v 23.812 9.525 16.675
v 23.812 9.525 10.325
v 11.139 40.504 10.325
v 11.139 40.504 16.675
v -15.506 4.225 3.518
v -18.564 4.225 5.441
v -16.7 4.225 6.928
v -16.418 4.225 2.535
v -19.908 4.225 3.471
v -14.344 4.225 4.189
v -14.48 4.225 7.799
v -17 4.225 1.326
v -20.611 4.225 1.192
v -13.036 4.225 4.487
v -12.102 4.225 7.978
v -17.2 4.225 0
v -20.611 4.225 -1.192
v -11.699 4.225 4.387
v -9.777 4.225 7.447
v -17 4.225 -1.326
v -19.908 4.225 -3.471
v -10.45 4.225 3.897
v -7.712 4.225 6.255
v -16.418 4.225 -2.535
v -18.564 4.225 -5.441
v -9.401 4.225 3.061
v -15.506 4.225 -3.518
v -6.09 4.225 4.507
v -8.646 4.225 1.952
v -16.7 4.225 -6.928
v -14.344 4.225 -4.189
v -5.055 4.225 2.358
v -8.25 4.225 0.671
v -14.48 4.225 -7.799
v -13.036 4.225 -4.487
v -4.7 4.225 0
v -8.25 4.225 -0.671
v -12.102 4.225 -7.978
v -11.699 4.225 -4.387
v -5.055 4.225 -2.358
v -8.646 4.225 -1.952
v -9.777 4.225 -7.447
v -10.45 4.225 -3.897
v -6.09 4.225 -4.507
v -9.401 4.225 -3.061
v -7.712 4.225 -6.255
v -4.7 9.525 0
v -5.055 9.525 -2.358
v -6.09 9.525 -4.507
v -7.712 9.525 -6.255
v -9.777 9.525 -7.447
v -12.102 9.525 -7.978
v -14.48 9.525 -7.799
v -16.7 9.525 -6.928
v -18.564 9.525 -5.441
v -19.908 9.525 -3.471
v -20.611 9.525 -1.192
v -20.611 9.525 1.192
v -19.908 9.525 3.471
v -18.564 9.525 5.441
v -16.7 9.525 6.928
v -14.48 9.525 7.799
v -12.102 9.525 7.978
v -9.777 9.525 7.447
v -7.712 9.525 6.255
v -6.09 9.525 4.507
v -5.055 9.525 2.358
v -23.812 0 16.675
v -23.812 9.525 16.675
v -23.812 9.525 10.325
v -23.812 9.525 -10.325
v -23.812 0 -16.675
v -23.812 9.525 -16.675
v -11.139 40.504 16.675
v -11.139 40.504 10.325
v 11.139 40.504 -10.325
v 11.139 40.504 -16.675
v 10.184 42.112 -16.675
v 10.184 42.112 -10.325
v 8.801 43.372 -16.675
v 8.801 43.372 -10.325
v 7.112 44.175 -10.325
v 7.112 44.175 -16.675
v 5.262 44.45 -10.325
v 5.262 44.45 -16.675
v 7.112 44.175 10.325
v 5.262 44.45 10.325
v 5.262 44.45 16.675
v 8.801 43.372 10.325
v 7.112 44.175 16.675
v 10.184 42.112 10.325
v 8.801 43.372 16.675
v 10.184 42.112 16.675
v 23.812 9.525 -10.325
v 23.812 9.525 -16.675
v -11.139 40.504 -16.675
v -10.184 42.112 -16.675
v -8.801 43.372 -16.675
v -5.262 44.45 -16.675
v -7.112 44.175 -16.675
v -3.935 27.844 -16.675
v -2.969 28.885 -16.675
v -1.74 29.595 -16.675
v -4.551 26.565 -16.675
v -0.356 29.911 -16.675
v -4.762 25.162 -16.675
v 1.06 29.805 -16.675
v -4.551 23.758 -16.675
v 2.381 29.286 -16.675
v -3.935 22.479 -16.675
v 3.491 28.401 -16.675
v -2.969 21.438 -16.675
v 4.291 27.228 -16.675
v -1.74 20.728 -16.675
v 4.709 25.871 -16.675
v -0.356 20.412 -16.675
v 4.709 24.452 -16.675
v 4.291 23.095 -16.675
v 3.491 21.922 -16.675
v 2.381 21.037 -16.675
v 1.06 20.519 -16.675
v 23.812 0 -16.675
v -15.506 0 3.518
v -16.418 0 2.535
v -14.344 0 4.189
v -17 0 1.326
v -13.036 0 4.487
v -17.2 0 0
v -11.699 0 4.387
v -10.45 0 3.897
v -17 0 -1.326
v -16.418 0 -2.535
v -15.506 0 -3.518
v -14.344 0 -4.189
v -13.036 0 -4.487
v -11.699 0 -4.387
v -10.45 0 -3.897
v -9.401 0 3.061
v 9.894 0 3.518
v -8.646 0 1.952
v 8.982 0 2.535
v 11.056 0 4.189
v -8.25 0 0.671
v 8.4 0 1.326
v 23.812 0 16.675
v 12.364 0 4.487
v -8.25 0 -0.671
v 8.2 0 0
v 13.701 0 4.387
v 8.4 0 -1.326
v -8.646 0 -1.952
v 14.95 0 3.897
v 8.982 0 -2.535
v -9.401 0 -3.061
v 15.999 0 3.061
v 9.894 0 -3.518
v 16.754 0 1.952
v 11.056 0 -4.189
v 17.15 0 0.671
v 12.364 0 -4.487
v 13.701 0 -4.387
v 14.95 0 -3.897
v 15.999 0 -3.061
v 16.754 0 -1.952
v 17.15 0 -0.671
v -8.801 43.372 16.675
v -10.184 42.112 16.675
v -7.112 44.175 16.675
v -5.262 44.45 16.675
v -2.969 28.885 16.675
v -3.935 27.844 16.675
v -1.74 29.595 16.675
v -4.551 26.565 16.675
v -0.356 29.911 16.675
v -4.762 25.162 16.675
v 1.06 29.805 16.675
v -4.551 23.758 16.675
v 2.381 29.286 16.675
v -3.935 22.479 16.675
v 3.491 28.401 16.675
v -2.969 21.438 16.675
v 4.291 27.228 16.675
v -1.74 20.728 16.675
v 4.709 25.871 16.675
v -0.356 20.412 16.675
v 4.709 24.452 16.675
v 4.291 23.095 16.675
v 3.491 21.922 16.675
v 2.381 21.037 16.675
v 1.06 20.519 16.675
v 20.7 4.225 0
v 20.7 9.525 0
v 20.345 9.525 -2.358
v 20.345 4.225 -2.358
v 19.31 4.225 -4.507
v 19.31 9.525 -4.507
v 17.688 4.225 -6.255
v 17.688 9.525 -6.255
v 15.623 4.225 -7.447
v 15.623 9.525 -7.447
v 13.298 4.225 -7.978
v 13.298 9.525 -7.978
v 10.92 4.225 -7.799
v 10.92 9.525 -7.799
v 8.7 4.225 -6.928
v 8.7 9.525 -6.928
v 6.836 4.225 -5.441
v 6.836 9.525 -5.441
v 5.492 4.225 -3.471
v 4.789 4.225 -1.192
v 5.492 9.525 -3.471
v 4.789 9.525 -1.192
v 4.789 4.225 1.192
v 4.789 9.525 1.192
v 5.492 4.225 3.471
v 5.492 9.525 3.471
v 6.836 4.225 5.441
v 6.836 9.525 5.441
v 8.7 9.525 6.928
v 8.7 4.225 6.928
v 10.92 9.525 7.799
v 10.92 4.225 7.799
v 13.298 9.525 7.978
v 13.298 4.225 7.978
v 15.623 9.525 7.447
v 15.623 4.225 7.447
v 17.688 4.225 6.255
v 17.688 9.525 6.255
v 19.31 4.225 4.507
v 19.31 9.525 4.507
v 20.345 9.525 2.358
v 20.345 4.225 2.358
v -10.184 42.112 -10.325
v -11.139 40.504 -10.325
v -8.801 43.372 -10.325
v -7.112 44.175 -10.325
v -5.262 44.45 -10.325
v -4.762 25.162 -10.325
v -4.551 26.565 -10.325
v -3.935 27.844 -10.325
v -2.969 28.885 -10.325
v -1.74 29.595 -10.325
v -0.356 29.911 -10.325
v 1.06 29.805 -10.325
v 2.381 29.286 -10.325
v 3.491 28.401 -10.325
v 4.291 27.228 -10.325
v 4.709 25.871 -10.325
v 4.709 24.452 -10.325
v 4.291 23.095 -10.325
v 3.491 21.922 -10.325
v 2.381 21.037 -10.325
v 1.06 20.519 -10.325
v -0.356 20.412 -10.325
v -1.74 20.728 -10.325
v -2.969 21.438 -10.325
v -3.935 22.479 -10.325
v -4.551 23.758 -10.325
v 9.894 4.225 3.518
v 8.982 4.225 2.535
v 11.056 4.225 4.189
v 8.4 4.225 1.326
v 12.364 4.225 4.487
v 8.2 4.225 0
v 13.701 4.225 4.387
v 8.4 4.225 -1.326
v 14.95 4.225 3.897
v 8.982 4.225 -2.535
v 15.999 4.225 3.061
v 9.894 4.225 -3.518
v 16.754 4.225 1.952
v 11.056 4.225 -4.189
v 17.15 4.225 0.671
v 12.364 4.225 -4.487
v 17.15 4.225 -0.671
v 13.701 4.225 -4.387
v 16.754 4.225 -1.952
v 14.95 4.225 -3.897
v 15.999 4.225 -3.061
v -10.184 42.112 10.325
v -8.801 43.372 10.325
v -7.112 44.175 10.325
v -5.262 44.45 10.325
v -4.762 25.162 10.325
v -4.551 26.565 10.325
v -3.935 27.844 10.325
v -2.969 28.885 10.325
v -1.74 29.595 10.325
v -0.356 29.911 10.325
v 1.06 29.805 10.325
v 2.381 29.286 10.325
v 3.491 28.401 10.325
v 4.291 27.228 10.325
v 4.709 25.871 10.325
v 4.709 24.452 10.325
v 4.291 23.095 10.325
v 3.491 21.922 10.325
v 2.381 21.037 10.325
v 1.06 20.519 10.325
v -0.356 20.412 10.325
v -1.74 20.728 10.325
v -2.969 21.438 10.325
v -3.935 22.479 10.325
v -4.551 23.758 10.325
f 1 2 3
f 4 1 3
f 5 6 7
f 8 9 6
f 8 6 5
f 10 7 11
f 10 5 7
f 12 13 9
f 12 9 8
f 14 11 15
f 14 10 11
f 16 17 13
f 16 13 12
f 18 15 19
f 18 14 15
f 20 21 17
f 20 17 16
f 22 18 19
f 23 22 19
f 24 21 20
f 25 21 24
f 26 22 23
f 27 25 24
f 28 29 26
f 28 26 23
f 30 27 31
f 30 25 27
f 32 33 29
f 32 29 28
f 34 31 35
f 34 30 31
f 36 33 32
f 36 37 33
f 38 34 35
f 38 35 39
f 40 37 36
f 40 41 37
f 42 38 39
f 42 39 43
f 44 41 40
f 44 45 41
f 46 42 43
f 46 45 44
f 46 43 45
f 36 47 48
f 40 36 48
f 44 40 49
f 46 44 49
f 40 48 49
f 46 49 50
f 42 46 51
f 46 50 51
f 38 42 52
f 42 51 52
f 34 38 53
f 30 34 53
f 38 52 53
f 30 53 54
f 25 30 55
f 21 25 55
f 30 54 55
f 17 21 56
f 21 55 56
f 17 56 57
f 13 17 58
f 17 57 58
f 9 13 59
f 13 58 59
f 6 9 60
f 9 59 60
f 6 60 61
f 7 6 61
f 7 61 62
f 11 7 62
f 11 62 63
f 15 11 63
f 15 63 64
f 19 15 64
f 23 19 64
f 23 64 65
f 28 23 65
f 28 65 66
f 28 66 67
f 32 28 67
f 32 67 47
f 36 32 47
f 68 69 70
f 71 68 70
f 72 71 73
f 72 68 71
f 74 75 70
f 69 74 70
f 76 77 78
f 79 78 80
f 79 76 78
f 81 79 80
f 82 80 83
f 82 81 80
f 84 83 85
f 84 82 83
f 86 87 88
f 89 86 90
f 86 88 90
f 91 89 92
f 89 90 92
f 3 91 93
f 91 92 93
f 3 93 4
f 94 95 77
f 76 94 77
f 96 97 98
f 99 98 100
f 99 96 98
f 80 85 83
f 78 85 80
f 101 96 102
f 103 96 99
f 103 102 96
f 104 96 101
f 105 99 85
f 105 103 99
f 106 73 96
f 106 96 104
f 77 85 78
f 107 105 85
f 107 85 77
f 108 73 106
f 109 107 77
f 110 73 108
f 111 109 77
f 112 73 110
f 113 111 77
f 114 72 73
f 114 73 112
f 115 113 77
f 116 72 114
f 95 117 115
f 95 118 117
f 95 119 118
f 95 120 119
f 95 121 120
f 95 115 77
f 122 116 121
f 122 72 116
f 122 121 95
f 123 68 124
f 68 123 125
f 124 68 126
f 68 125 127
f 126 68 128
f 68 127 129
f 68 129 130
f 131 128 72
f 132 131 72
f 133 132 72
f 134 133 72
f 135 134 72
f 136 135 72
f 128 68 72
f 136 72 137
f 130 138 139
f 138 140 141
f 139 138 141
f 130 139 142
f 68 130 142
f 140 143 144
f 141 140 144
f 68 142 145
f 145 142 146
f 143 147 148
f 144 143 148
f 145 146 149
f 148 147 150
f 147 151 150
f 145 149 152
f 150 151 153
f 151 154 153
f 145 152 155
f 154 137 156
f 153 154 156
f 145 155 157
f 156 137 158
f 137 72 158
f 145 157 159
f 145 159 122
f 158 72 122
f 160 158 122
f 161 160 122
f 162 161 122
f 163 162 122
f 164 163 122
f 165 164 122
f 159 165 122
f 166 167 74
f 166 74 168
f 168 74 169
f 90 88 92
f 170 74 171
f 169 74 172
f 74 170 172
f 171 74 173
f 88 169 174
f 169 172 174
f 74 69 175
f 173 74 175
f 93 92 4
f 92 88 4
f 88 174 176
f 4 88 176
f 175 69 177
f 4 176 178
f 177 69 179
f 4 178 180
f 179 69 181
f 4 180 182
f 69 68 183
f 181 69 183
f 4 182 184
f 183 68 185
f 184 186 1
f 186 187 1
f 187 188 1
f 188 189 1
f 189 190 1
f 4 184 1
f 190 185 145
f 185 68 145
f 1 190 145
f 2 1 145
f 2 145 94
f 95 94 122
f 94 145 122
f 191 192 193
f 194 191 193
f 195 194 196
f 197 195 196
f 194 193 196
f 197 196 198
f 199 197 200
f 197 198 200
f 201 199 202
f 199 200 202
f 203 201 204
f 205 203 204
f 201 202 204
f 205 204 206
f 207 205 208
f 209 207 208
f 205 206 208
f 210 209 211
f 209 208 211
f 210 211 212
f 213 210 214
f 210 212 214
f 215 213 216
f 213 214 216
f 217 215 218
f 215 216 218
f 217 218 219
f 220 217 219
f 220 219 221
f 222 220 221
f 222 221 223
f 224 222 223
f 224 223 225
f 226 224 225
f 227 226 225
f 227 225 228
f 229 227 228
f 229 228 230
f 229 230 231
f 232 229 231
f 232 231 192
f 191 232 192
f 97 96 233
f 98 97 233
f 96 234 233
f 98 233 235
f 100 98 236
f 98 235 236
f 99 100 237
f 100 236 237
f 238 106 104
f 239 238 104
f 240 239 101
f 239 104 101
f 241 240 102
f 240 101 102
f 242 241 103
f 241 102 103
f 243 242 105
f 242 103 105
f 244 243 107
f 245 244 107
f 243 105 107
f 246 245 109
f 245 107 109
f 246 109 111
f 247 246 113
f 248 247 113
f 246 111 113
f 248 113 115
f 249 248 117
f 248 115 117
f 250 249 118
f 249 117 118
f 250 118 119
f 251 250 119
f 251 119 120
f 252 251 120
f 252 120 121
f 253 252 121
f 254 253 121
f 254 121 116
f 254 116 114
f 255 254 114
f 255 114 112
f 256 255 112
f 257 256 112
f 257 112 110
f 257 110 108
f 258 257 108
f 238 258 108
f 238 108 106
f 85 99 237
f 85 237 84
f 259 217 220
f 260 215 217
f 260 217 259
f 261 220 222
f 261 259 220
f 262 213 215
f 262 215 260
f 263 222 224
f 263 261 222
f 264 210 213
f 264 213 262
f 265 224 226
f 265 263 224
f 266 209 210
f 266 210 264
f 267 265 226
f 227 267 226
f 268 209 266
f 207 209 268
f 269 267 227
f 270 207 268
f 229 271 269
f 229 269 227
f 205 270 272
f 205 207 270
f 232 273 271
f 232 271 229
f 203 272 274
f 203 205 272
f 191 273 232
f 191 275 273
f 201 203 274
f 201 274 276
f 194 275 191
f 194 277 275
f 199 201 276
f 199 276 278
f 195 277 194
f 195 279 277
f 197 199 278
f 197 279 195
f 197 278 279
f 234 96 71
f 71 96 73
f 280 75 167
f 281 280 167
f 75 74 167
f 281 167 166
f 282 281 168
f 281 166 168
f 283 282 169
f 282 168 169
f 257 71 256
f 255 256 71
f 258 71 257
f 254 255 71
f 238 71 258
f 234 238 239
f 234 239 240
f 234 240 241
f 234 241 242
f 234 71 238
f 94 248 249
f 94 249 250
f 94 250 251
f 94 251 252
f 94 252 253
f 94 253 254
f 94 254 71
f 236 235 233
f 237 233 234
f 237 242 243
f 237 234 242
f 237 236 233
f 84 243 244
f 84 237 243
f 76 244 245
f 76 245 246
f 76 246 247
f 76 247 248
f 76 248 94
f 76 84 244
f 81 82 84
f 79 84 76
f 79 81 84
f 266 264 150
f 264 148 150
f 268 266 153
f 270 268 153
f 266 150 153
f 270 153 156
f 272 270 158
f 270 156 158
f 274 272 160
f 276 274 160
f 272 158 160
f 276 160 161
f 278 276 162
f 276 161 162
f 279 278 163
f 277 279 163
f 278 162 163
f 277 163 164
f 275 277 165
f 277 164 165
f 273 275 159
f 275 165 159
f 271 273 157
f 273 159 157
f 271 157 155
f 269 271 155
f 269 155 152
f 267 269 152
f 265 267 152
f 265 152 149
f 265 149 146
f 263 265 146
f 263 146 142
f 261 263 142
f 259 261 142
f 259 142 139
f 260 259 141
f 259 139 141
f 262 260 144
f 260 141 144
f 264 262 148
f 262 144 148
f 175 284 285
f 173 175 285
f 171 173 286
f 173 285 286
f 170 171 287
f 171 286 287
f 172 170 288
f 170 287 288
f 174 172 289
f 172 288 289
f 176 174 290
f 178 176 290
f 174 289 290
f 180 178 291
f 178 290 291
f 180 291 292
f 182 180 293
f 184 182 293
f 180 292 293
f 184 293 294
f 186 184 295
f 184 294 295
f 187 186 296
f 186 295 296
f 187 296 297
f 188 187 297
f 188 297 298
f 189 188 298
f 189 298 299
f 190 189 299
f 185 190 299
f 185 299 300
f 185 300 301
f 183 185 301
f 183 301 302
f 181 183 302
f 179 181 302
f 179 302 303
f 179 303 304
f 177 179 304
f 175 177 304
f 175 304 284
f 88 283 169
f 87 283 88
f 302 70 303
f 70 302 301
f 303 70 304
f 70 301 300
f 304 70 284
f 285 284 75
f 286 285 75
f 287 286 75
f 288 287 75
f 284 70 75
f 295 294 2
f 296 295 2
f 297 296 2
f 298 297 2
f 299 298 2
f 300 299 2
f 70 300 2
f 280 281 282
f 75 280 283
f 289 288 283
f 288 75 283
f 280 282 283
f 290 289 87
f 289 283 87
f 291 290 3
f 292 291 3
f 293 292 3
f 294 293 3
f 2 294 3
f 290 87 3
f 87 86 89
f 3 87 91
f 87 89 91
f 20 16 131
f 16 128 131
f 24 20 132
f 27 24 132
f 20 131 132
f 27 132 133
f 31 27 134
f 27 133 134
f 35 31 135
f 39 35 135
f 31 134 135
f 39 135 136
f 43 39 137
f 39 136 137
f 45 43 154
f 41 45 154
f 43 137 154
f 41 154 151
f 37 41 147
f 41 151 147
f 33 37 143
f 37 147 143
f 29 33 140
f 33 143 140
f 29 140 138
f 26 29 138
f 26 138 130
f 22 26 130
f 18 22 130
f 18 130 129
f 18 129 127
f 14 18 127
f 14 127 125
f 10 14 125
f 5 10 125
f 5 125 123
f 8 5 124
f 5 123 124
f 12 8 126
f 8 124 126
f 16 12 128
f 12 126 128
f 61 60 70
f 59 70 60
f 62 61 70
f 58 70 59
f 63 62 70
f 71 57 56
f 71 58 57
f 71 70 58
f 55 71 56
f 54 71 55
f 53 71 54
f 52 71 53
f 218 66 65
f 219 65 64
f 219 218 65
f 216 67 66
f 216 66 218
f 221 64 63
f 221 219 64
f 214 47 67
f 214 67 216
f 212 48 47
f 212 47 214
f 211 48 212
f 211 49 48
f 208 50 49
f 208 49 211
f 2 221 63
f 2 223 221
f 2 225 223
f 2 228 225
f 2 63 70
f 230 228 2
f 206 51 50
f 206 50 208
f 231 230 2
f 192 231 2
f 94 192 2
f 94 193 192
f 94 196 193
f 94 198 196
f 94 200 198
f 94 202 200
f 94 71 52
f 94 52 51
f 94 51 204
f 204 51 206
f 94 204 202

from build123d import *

# Parameters (mm, degrees)
SKETCH1_W                               = 47.625
SKETCH1_H                               = 33.3502
BOSS_EXTRUDE1_DEPTH                     = 44.45
SKETCH2_W                               = 47.625
SKETCH2_H                               = 20.6502
CUT_EXTRUDE1_DEPTH                      = 34.925
CUT_EXTRUDE2_DEPTH                      = 1
CUT_EXTRUDE2_DEPTH_BACK                 = 34.3502
CBORE_FOR_M8_HEX_HEAD_BOLT1_D           = 9
CBORE_FOR_M8_HEX_HEAD_BOLT1_DEPTH       = 13.298127214
CBORE_FOR_M8_HEX_HEAD_BOLT1_CBORE_D     = 16
CBORE_FOR_M8_HEX_HEAD_BOLT1_CBORE_DEPTH = 5.3
CBORE_FOR_M8_HEX_HEAD_BOLT1_TIP         = 2.703872786
FILLET3_R                               = 6.35
F_3_8_0_375_DIAMETER_HOLE1_D            = 9.525


with BuildPart() as part:
    # Sketch1 → Boss-Extrude1 (new body)
    with BuildSketch(Plane(origin=(0, 0, 0), x_dir=(1, 0, 0), z_dir=(0, 1, 0))):
        Rectangle(SKETCH1_W, SKETCH1_H)
    extrude(amount=BOSS_EXTRUDE1_DEPTH)

    # Sketch2 → Cut-Extrude1 (cut)
    with BuildSketch(Plane(origin=(0, 44.45, 0), x_dir=(1, 0, 0), z_dir=(0, 1, 0))):
        Rectangle(SKETCH2_W, SKETCH2_H)
    extrude(amount=-CUT_EXTRUDE1_DEPTH, mode=Mode.SUBTRACT)

    # Sketch3 → Cut-Extrude2 (cut, two sides)
    with BuildSketch(Plane(origin=(0, 0, -16.6751), x_dir=(-1, 0, 0), z_dir=(0, 0, -1))) as cut_extrude2_sk:
        Polygon((23.8125, 44.45), (9.525, 44.45), (23.8125, 9.525), align=None)
        Polygon((-23.8125, 9.525), (-9.525, 44.45), (-23.8125, 44.45), align=None)
    extrude(amount=CUT_EXTRUDE2_DEPTH, mode=Mode.SUBTRACT)
    extrude(cut_extrude2_sk.sketch, amount=-CUT_EXTRUDE2_DEPTH_BACK, mode=Mode.SUBTRACT)

    # CBORE for M8 Hex Head Bolt1
    with Locations(Plane(origin=(0, 9.525, 0), x_dir=(1, 0, 0), z_dir=(0, 1, 0))):
        with Locations((-12.7, 0), (12.7, 0)):
            CounterBoreHole(CBORE_FOR_M8_HEX_HEAD_BOLT1_D / 2, CBORE_FOR_M8_HEX_HEAD_BOLT1_CBORE_D / 2, CBORE_FOR_M8_HEX_HEAD_BOLT1_CBORE_DEPTH, depth=CBORE_FOR_M8_HEX_HEAD_BOLT1_DEPTH)
            with Locations((0, 0, -(CBORE_FOR_M8_HEX_HEAD_BOLT1_DEPTH + CBORE_FOR_M8_HEX_HEAD_BOLT1_TIP / 2))):  # 118° drill point
                Cone(0, CBORE_FOR_M8_HEX_HEAD_BOLT1_D / 2, CBORE_FOR_M8_HEX_HEAD_BOLT1_TIP, mode=Mode.SUBTRACT)

    # Fillet3
    fillet3_edges = [part.edges().sort_by_distance(p)[0] for p in [
        (9.525, 44.45, 13.5001),
        (-9.525, 44.45, 13.5001),
        (9.525, 44.45, -13.5001),
        (-9.525, 44.45, -13.5001),
    ]]
    fillet(fillet3_edges, radius=FILLET3_R)

    # 3/8 (0.375) Diameter Hole1 (through all)
    with Locations(Plane.XY.offset(16.6751)):
        with Locations((0, 25.161662577)):
            Hole(F_3_8_0_375_DIAMETER_HOLE1_D / 2)


solid = part.part
